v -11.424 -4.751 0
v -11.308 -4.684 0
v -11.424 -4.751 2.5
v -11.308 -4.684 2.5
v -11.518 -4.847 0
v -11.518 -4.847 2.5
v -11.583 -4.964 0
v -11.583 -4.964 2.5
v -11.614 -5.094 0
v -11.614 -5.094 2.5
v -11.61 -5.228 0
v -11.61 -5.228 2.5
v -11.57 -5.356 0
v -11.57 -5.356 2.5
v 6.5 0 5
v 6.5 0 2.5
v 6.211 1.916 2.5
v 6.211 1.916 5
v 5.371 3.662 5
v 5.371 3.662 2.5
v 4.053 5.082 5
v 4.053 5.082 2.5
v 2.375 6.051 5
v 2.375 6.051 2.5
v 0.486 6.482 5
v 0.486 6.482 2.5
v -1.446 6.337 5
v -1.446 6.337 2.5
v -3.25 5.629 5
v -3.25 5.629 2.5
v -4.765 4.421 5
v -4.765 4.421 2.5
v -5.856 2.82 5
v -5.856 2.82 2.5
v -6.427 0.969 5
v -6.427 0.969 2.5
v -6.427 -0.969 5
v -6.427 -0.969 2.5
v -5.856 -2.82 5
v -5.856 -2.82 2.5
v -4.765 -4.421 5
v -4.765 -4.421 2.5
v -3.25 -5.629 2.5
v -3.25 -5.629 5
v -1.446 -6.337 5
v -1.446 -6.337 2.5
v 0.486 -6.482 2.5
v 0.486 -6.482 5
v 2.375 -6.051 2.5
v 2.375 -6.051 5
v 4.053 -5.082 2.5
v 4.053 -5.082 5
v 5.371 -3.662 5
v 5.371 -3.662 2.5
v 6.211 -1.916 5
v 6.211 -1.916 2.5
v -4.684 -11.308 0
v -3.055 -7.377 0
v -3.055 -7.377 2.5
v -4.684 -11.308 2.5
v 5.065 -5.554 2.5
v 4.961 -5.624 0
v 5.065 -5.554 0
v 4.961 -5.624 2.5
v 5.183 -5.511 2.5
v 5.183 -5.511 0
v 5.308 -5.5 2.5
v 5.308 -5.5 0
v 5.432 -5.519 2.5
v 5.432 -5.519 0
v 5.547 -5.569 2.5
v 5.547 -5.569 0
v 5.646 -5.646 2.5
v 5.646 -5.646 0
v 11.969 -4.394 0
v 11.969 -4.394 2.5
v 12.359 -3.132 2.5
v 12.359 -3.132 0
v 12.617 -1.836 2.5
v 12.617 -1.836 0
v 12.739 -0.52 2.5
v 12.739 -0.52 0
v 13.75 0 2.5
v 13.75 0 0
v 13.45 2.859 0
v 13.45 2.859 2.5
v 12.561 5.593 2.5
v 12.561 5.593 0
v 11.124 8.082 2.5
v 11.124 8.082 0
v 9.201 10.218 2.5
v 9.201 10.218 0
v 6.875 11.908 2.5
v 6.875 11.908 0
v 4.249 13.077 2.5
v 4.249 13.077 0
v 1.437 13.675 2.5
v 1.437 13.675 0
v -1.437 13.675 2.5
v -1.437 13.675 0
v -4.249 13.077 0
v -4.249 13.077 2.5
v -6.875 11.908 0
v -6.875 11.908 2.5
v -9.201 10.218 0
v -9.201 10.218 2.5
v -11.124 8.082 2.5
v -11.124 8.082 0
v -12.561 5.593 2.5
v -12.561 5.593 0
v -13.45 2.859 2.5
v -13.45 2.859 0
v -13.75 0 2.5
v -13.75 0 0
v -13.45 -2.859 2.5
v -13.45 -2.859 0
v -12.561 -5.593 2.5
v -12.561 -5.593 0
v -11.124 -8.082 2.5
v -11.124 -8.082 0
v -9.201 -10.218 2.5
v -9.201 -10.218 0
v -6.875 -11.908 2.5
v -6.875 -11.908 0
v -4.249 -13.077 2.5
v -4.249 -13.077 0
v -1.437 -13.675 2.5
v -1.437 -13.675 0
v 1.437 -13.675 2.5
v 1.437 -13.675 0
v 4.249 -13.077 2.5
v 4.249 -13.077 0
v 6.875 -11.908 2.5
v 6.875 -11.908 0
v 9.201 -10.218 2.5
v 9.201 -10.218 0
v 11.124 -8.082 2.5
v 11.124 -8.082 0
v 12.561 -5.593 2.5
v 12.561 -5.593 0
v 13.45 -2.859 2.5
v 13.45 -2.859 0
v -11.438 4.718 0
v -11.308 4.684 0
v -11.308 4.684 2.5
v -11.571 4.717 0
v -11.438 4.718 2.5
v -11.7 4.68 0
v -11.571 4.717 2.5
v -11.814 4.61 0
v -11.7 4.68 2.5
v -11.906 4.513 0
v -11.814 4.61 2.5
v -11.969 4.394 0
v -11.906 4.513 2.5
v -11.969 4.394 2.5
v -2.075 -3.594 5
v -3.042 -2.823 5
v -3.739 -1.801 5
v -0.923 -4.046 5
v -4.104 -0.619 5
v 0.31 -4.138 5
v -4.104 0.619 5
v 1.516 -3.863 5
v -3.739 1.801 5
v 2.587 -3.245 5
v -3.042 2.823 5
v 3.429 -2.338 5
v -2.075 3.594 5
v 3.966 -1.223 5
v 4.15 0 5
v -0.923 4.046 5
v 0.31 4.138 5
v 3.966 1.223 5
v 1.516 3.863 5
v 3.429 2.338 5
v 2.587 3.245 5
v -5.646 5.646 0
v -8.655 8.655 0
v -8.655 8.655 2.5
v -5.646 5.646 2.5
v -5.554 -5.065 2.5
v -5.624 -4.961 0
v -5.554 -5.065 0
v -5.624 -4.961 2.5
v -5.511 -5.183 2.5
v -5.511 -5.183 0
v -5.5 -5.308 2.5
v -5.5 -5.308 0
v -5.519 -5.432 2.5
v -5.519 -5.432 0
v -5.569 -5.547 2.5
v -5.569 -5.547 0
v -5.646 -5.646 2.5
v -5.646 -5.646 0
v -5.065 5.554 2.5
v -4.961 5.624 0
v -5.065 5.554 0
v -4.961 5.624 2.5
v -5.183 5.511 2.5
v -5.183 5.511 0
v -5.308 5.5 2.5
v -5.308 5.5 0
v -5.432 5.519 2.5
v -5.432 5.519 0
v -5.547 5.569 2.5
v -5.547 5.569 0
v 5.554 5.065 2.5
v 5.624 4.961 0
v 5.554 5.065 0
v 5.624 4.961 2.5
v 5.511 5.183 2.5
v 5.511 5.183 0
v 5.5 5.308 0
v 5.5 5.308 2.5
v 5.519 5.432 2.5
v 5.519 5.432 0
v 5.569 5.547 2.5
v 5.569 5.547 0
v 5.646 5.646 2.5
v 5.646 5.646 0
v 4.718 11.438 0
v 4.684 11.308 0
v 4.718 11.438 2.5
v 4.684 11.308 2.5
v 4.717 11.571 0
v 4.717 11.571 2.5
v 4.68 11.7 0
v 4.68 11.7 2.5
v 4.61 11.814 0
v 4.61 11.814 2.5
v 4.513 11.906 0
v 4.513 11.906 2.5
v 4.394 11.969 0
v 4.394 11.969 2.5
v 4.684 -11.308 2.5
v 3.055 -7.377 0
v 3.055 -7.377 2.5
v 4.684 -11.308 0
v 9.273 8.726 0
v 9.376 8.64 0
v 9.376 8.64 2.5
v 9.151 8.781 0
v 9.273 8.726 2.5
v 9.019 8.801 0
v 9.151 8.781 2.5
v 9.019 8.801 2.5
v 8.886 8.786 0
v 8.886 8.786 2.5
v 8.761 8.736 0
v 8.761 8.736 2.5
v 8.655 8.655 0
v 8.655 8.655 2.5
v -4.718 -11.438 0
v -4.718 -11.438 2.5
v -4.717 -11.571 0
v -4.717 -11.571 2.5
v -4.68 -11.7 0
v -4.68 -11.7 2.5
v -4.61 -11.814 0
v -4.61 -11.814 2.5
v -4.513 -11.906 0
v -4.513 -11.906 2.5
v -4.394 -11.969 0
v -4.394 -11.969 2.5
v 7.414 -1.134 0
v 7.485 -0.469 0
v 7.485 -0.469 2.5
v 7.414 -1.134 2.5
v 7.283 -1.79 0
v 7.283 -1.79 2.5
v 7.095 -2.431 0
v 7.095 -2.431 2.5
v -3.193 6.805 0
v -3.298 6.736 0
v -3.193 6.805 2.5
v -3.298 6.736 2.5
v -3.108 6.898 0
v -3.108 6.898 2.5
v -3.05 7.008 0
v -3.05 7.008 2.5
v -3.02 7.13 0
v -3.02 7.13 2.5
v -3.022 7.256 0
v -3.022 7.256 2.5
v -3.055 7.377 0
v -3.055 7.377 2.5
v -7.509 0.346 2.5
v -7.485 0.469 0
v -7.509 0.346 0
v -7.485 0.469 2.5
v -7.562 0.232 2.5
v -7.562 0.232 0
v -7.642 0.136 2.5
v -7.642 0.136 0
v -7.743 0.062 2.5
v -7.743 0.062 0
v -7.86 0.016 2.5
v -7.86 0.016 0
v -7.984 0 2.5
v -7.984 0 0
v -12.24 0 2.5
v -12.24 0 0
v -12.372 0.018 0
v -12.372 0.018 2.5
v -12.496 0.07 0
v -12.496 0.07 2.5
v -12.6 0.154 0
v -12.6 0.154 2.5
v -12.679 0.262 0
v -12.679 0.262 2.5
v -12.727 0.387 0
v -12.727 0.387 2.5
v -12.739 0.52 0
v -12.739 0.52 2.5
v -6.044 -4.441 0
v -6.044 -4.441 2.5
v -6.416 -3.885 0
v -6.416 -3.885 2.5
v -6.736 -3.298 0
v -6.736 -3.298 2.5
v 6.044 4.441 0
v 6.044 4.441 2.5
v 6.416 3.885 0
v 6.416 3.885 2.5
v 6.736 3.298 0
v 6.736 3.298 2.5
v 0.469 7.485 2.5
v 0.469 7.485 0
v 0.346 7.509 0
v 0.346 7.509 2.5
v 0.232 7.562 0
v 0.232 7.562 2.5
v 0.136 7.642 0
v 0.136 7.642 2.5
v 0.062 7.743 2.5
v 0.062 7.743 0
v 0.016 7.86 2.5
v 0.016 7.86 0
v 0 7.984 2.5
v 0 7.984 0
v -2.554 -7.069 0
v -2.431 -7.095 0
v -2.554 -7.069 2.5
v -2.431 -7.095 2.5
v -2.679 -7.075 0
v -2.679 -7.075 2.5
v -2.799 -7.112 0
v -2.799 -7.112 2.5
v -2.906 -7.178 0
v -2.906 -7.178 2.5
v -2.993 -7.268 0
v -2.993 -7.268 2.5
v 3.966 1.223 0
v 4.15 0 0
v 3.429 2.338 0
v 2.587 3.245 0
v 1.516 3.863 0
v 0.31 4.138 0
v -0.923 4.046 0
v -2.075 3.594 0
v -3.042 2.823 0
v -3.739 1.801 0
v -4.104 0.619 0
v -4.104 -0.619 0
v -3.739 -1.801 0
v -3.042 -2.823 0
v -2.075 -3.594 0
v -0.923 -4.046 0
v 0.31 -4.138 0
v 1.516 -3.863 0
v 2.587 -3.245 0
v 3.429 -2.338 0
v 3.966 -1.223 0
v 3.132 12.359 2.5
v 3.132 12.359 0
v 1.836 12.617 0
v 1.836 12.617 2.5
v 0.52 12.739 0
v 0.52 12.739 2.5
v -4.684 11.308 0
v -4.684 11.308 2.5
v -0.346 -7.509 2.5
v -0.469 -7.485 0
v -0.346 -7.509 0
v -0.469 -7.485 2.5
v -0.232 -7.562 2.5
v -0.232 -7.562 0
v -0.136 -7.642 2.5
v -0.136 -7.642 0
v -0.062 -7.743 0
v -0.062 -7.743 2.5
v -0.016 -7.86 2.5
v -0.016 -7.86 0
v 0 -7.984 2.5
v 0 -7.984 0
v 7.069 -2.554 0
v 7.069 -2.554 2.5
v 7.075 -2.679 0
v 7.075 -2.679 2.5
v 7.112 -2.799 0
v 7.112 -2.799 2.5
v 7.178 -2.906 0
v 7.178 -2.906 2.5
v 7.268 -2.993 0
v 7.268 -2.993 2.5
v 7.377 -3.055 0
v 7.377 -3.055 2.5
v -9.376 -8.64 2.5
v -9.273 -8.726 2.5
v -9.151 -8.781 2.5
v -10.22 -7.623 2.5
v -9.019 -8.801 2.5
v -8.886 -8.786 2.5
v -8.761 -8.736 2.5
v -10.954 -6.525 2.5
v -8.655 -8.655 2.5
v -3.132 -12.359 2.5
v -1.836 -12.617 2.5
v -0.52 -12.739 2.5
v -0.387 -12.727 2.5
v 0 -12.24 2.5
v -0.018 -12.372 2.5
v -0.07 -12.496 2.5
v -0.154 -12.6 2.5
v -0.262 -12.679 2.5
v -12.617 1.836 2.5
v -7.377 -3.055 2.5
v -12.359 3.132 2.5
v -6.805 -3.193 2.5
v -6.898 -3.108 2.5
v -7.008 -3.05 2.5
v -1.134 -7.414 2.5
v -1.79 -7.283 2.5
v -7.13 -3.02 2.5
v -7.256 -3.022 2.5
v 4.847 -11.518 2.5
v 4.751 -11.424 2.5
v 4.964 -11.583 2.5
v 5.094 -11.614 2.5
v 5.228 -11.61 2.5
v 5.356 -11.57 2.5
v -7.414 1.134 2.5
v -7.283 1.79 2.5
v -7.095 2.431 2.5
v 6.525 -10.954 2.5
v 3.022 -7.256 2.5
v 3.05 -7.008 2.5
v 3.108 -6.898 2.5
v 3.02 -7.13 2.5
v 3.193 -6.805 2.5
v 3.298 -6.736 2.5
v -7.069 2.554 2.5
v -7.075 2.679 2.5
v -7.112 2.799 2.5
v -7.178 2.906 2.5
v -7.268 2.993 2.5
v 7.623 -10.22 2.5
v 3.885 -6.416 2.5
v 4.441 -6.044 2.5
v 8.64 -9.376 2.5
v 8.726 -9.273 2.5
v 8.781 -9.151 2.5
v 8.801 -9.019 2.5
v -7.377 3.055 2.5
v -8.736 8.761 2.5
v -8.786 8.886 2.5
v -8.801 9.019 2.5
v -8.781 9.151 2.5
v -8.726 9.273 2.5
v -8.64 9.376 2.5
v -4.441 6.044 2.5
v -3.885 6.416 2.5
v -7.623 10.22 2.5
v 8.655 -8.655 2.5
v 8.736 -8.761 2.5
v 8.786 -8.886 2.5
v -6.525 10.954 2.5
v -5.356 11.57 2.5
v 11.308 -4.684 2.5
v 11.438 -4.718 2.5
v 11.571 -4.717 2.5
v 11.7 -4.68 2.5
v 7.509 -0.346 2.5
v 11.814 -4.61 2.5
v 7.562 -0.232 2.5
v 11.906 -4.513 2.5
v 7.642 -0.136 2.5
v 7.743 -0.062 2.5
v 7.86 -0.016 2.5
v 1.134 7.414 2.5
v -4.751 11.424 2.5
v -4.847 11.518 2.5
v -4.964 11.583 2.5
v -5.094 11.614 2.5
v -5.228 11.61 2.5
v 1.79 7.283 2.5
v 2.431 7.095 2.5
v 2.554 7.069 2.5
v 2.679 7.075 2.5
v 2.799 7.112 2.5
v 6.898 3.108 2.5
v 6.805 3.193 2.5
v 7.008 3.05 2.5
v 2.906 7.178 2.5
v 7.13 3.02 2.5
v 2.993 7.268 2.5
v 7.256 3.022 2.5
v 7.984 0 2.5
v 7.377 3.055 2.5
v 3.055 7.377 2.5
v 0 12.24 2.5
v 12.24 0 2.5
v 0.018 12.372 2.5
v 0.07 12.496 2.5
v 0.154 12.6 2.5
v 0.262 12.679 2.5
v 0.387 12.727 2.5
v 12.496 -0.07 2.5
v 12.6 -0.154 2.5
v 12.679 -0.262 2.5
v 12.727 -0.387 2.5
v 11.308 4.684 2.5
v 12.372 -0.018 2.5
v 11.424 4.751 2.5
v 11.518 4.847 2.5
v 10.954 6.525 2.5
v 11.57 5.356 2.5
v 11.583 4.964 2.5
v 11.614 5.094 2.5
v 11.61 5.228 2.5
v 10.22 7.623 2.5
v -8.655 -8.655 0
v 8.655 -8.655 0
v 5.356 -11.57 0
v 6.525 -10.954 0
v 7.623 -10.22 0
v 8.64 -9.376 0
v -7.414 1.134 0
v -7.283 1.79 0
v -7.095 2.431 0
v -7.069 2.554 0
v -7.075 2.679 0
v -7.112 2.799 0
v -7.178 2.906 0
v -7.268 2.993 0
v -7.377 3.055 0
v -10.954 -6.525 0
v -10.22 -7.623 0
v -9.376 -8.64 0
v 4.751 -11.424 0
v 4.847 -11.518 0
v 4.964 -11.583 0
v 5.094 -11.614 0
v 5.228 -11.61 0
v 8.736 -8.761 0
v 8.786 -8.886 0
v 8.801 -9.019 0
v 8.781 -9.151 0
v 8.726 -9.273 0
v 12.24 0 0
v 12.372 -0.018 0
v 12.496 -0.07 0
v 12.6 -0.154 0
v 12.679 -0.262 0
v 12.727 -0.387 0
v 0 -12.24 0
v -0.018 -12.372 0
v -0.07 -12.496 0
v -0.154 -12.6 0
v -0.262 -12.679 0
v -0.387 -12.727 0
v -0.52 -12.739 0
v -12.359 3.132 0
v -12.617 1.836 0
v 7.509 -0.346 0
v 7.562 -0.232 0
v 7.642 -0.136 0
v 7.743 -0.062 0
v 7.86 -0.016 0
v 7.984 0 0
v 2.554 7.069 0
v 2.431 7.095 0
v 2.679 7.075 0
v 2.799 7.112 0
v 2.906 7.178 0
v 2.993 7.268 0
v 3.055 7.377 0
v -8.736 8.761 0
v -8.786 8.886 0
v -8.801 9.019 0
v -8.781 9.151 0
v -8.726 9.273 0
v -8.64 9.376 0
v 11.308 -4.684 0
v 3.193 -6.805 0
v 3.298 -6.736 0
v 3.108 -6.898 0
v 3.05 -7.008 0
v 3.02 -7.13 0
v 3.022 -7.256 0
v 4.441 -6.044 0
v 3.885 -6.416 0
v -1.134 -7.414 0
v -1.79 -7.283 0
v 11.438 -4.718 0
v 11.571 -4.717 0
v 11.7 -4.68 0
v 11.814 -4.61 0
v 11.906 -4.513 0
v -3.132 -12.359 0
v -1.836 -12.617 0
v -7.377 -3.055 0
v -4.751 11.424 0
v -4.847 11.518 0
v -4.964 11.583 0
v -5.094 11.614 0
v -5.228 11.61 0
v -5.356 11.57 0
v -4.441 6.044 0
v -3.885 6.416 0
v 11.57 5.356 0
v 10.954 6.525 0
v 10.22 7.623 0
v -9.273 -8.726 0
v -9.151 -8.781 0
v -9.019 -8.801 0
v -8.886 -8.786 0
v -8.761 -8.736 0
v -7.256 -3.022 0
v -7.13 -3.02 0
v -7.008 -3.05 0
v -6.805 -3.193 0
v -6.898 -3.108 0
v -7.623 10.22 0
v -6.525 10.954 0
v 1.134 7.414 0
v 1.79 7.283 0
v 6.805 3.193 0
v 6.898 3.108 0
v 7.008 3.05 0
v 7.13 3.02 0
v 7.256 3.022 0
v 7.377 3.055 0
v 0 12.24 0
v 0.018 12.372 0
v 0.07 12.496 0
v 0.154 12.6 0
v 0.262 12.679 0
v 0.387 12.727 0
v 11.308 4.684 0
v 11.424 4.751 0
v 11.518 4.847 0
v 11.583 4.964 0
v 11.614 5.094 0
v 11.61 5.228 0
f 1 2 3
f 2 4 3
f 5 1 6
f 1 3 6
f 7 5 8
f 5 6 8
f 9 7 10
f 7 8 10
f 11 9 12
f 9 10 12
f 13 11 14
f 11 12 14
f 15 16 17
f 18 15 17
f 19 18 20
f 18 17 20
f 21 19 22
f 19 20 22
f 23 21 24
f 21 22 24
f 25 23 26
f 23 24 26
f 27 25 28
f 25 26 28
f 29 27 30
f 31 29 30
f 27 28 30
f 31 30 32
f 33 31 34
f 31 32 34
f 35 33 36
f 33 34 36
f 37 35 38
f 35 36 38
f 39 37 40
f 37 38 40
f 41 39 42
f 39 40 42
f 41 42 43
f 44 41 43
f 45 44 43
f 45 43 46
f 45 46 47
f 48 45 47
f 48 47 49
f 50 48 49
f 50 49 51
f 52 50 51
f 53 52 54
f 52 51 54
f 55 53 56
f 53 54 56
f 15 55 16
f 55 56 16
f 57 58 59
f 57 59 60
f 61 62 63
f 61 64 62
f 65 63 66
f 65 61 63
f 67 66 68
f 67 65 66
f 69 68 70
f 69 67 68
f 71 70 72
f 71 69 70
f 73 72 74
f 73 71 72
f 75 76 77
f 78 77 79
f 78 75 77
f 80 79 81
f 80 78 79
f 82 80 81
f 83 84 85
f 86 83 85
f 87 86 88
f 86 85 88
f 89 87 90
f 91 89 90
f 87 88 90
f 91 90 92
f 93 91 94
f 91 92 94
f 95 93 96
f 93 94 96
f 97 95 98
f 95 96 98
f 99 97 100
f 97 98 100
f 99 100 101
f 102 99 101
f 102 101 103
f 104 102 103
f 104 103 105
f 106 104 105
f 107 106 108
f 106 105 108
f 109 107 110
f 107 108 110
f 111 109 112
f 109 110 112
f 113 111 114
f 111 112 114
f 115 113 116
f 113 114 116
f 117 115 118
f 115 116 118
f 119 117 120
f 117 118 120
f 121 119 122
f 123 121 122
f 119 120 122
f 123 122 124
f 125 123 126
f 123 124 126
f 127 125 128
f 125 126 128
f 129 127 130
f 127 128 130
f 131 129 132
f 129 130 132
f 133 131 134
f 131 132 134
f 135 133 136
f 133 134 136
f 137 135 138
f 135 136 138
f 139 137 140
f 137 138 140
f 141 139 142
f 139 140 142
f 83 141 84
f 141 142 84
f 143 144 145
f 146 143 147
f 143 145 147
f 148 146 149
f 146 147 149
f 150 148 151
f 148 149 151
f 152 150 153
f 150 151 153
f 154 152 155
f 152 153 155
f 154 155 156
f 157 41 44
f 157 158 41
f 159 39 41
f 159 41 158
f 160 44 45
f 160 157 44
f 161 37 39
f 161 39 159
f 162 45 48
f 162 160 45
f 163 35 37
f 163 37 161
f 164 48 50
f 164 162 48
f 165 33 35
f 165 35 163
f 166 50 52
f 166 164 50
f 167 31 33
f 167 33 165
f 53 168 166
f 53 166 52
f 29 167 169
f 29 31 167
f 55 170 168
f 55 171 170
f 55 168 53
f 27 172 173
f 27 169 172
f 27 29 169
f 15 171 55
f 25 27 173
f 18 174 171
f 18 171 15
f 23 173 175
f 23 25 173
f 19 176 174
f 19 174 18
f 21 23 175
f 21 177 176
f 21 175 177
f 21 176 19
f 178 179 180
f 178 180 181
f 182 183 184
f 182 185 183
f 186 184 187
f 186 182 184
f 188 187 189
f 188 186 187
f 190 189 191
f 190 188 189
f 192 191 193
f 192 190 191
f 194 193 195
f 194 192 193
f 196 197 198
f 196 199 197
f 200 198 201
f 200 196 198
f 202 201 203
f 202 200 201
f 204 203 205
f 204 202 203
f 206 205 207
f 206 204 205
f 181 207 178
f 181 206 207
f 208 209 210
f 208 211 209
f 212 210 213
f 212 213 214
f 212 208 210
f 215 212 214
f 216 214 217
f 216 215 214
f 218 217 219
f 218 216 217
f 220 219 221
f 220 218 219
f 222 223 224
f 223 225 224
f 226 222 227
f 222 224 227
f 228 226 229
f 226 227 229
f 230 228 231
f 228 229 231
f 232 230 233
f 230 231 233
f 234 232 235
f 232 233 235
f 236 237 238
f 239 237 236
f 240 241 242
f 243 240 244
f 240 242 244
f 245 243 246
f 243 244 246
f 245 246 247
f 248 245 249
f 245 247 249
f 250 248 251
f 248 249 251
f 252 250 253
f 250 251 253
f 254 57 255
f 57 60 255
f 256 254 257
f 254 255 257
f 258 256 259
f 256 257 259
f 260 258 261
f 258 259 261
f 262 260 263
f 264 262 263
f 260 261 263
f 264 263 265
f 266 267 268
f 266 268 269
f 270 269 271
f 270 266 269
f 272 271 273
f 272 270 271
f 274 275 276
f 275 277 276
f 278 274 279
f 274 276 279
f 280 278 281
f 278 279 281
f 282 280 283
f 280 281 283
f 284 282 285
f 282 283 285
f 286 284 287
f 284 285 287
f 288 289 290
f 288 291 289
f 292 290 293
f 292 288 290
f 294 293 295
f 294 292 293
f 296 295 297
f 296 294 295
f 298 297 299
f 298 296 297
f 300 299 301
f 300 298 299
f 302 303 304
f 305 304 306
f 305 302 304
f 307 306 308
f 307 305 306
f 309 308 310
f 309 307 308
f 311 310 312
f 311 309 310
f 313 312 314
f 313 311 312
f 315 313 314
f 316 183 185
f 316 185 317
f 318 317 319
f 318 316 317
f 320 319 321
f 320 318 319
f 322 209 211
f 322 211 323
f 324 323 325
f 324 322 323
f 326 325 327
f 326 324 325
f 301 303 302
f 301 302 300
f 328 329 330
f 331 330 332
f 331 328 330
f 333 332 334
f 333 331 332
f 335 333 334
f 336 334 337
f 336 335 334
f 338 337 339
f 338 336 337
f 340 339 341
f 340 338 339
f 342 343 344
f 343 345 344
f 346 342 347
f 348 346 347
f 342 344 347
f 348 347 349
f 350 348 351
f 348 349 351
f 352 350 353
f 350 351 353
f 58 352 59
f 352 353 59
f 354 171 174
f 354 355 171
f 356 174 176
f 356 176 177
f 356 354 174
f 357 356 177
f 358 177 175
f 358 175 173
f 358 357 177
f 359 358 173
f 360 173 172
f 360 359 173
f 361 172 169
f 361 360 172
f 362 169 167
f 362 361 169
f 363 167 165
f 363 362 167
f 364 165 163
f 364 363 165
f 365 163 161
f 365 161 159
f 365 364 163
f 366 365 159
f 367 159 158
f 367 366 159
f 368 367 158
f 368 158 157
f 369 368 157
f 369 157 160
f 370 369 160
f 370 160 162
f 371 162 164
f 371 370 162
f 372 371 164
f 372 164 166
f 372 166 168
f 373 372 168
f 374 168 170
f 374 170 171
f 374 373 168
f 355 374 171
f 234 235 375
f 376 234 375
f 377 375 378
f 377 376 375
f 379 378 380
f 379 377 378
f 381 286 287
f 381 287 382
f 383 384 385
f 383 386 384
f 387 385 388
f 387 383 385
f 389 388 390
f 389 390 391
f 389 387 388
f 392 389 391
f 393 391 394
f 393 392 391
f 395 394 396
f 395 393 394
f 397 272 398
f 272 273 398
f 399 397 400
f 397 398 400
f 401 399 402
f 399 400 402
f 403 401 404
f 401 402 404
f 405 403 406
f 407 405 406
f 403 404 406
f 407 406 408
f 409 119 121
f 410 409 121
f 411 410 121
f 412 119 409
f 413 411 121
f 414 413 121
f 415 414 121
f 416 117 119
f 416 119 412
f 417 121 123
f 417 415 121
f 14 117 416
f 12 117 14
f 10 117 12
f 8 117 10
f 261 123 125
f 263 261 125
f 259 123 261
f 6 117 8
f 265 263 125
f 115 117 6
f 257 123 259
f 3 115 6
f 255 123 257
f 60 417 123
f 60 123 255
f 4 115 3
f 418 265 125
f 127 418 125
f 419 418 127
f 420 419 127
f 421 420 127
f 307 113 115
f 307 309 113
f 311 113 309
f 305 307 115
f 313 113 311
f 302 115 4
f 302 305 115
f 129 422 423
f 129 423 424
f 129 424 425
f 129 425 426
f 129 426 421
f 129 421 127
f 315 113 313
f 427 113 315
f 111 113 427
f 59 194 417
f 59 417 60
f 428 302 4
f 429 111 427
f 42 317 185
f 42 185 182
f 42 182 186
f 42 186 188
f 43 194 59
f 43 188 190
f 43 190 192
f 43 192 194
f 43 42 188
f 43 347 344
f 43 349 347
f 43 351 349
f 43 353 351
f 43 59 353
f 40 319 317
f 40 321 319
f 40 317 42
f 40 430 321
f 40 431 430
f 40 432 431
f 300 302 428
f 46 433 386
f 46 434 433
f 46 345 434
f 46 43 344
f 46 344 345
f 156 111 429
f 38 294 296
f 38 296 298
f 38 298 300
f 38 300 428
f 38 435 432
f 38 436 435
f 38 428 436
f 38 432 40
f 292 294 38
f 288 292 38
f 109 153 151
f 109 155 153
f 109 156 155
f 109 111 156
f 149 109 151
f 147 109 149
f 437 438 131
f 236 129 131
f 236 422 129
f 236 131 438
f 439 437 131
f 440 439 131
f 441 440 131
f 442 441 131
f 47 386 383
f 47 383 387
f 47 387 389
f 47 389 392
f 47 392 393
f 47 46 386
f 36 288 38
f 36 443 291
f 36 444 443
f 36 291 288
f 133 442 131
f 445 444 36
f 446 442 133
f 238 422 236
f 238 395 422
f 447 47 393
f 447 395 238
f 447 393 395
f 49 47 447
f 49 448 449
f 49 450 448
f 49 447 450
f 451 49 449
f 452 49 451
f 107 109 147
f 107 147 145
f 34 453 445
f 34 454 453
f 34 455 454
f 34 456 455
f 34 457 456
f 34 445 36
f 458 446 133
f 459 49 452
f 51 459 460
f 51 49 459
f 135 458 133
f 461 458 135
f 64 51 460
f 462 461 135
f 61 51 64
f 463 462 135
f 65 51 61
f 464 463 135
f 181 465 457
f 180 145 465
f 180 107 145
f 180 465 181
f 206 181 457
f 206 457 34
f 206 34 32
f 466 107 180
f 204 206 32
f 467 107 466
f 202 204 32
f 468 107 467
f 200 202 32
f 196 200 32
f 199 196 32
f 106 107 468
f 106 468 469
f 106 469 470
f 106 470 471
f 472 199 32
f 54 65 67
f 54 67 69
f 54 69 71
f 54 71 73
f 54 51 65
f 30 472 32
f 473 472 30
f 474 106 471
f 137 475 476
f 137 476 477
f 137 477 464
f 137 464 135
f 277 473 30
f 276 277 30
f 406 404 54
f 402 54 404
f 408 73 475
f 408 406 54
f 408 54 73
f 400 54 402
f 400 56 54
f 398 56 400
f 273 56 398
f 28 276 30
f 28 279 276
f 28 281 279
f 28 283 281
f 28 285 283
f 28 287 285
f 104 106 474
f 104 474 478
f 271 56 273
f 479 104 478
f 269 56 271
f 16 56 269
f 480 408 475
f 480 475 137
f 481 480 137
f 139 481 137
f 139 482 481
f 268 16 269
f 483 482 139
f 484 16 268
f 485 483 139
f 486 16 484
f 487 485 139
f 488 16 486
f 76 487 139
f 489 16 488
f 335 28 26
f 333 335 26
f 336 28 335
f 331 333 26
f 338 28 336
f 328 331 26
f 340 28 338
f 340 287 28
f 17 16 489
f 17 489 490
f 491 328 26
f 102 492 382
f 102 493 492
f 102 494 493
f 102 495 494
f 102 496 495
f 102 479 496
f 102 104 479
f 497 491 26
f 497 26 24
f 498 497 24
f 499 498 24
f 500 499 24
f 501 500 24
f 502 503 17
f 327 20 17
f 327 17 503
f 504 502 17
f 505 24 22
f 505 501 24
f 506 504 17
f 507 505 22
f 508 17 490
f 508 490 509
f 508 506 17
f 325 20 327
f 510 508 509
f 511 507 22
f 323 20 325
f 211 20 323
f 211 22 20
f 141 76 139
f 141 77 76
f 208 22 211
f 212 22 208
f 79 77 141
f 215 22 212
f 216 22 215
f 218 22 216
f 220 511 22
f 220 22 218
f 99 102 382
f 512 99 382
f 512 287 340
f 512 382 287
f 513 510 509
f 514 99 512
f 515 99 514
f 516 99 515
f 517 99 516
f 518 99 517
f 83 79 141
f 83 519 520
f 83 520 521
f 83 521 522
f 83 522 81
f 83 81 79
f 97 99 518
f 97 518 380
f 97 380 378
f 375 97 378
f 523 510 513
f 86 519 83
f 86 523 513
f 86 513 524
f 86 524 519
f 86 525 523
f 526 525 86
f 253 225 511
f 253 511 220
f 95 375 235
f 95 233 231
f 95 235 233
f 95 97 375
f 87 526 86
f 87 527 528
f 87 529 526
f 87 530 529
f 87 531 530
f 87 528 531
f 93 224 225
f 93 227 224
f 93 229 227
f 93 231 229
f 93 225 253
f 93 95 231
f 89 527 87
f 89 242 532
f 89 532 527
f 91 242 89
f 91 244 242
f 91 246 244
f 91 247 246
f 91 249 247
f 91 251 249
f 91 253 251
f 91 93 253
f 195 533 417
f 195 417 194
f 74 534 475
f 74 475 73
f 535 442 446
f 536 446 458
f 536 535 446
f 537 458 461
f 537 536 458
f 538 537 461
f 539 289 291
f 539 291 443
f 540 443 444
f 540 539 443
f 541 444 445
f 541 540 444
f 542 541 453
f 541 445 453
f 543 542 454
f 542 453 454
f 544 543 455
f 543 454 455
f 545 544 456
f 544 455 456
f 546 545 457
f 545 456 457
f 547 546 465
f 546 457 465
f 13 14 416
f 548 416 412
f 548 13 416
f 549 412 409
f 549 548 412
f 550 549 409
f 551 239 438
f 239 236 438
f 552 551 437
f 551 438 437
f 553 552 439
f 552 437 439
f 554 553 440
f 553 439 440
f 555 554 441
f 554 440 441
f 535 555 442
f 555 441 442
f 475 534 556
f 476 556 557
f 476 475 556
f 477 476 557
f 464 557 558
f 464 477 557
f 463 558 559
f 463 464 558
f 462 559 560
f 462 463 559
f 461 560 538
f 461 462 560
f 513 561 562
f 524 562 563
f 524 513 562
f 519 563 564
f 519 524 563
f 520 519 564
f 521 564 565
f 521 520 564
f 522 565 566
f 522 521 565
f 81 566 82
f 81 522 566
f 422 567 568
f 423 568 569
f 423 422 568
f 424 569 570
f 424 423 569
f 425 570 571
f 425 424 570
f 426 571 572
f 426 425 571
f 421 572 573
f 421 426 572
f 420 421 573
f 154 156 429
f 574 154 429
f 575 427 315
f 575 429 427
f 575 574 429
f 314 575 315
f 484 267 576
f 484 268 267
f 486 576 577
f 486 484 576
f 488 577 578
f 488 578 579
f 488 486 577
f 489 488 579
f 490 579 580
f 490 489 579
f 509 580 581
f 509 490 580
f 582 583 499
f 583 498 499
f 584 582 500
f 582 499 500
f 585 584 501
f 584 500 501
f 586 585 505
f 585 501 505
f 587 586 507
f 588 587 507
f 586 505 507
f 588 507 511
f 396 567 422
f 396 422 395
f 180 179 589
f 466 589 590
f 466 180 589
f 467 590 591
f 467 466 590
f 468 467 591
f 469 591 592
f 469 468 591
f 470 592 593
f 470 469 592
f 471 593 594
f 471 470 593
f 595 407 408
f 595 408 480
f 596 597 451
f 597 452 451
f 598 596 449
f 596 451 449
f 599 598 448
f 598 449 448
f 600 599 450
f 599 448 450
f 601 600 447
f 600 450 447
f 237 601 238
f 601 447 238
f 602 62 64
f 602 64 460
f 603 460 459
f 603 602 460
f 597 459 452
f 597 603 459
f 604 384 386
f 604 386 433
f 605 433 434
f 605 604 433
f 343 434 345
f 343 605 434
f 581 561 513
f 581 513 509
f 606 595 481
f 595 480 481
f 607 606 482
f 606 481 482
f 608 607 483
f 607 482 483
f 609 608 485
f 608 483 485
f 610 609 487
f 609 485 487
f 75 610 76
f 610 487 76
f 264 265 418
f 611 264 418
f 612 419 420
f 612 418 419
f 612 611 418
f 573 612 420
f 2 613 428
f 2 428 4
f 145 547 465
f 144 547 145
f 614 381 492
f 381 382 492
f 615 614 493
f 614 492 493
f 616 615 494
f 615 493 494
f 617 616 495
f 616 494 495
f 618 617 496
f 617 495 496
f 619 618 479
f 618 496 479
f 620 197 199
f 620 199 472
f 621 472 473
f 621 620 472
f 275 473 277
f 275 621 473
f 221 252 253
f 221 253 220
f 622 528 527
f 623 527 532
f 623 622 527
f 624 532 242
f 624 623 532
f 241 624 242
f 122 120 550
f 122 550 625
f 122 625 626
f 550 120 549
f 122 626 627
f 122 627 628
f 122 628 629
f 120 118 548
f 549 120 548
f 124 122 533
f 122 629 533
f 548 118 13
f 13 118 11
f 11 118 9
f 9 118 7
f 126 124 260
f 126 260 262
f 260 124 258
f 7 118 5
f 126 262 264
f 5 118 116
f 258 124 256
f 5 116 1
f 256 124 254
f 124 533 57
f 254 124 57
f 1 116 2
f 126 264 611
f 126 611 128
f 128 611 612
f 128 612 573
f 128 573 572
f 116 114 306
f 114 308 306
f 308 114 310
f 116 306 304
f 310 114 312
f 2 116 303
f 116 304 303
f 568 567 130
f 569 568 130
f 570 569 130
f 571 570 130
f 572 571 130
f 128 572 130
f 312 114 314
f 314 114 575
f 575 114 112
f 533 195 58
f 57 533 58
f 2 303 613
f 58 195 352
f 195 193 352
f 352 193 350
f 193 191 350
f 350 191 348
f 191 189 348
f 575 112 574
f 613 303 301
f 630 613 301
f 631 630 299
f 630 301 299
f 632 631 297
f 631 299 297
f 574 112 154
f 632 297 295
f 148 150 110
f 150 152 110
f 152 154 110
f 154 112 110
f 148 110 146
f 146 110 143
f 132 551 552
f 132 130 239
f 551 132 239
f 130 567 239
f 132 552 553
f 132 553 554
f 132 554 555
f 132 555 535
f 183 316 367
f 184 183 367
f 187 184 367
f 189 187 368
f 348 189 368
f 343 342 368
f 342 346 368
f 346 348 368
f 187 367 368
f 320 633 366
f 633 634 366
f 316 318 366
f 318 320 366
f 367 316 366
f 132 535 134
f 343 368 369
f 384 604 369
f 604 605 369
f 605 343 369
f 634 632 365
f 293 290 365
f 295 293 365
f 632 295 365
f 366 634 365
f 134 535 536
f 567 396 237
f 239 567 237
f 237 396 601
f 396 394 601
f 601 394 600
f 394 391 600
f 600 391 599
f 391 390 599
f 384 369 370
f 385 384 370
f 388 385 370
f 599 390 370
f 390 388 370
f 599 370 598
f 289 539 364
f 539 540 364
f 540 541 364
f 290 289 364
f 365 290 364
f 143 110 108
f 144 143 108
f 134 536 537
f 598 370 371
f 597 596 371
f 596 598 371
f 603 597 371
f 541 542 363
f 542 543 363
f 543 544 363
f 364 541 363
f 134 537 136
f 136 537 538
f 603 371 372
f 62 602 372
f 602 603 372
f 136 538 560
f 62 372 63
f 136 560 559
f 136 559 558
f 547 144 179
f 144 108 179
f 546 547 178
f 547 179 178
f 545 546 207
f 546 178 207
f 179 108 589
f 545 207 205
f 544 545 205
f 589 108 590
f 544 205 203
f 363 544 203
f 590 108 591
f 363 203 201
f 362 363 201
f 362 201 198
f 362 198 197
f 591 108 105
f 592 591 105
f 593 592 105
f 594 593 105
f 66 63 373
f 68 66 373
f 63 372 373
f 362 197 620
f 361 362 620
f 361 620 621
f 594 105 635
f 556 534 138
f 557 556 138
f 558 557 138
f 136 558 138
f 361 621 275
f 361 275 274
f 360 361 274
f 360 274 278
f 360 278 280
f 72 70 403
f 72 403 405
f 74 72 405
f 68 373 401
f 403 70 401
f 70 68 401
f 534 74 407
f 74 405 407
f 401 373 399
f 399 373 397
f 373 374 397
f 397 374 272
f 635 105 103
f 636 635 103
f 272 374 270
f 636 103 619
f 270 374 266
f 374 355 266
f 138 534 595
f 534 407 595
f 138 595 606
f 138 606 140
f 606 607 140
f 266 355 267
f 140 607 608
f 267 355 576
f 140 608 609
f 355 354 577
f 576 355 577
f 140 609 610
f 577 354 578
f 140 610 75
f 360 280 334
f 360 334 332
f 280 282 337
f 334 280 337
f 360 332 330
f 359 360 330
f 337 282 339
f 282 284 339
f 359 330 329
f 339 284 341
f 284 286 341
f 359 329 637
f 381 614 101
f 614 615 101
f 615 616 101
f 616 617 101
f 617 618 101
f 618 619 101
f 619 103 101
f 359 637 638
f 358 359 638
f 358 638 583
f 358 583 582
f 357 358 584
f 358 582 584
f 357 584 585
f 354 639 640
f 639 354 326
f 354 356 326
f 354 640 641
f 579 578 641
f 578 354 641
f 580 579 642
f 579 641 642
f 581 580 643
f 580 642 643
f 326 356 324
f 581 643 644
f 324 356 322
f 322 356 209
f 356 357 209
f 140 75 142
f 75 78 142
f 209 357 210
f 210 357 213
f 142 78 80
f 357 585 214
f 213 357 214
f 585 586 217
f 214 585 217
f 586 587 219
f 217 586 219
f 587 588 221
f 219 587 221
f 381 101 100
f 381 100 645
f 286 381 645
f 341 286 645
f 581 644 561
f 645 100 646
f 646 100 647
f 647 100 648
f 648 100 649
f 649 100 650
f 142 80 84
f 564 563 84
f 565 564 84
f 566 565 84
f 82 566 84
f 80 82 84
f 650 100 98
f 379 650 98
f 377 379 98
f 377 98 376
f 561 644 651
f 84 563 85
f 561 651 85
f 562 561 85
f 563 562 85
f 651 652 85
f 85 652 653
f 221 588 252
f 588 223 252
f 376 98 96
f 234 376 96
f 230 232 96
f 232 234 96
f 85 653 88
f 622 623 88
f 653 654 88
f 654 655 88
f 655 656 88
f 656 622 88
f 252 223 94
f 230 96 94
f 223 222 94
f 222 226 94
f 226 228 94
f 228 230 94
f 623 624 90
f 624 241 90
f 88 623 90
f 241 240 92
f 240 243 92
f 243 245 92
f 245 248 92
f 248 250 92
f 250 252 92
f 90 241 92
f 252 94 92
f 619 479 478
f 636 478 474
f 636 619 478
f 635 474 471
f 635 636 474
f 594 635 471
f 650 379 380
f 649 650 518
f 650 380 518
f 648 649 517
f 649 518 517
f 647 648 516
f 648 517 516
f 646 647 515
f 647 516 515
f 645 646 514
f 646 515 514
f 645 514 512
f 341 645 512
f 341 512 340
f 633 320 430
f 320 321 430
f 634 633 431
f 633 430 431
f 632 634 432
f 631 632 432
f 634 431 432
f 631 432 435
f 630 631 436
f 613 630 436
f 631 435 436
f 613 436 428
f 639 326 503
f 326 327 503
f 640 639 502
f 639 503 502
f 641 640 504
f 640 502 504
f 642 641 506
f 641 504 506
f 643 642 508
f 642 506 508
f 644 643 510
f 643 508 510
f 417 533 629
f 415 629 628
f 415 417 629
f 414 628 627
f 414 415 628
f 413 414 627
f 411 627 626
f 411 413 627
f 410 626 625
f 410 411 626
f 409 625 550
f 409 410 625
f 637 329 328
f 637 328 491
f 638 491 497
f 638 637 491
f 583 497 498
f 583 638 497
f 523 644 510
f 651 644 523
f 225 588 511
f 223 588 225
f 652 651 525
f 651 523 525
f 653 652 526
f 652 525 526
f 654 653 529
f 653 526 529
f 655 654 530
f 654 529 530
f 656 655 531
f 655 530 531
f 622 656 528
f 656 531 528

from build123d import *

# Parameters (mm, degrees)
SKETCH1_R                = 13.75
SKETCH1_R_2              = 4.15
BOSS_EXTRUDE1_DEPTH      = 2.5
SKETCH2_R                = 6.5
SKETCH2_R_2              = 4.15
BOSS_EXTRUDE2_DEPTH      = 2.5
CUT_EXTRUDE1_DEPTH       = 21.077973005
FILLET1_R                = 0.5
CIRPATTERN1_COUNT        = 8
FILLET1_OF_CIRPATTERN1_R = 0.5


with BuildPart() as part:
    # Sketch1 → Boss-Extrude1 (new body)
    with BuildSketch(Plane.XY):
        Circle(SKETCH1_R)
        Circle(SKETCH1_R_2, mode=Mode.SUBTRACT)
    extrude(amount=BOSS_EXTRUDE1_DEPTH)

    # Sketch2 → Boss-Extrude2 (add)
    with BuildSketch(Plane.XY.offset(2.5)):
        Circle(SKETCH2_R)
        Circle(SKETCH2_R_2, mode=Mode.SUBTRACT)
    extrude(amount=BOSS_EXTRUDE2_DEPTH)

    # Sketch5 → Cut-Extrude1 (cut, through all)
    with BuildSketch(Plane.XY):
        with BuildLine():
            Line((0, 12.75), (0, 7.5))
            ThreePointArc((0, 7.5), (1.463177415, 7.355889603), (2.870125743, 6.929096494))
            Line((2.870125743, 6.929096494), (4.879213763, 11.77946404))
            ThreePointArc((4.879213763, 11.77946404), (2.487401606, 12.505012325), (0, 12.75))
        make_face()
    cut_extrude1 = extrude(amount=CUT_EXTRUDE1_DEPTH, mode=Mode.SUBTRACT)

    # Fillet1
    fillet1_edges = [part.edges().sort_by_distance(p)[0] for p in [
        (0, 7.5, 1.25),
        (2.870125743, 6.929096494, 1.25),
        (4.879213763, 11.77946404, 1.25),
        (0, 12.75, 1.25),
    ]]
    fillet(fillet1_edges, radius=FILLET1_R)

    # CirPattern1: Cut-Extrude1 ×8 about axis
    cirpattern1_axis = Axis((0, 0, 0), (0, 0, 1))
    for i in range(1, CIRPATTERN1_COUNT):
        add(cut_extrude1.rotate(cirpattern1_axis, i * 360 / CIRPATTERN1_COUNT), mode=Mode.SUBTRACT)

    # Fillet1 of CirPattern1
    fillet1_of_cirpattern1_edges = [part.edges().sort_by_distance(p)[0] for p in [
        (-5.303300859, 5.303300859, 1.25),
        (-2.870125743, 6.929096494, 1.25),
        (-4.879213763, 11.77946404, 1.25),
        (-9.01561146, 9.01561146, 1.25),
        (-7.5, 0, 1.25),
        (-6.929096494, 2.870125743, 1.25),
        (-11.77946404, 4.879213763, 1.25),
        (-12.75, 0, 1.25),
        (-5.303300859, -5.303300859, 1.25),
        (-6.929096494, -2.870125743, 1.25),
        (-11.77946404, -4.879213763, 1.25),
        (-9.01561146, -9.01561146, 1.25),
        (0, -7.5, 1.25),
        (-2.870125743, -6.929096494, 1.25),
        (-4.879213763, -11.77946404, 1.25),
        (0, -12.75, 1.25),
        (5.303300859, -5.303300859, 1.25),
        (2.870125743, -6.929096494, 1.25),
        (4.879213763, -11.77946404, 1.25),
        (9.01561146, -9.01561146, 1.25),
        (7.5, 0, 1.25),
        (6.929096494, -2.870125743, 1.25),
        (11.77946404, -4.879213763, 1.25),
        (12.75, 0, 1.25),
        (5.303300859, 5.303300859, 1.25),
        (6.929096494, 2.870125743, 1.25),
        (11.77946404, 4.879213763, 1.25),
        (9.01561146, 9.01561146, 1.25),
    ]]
    fillet(fillet1_of_cirpattern1_edges, radius=FILLET1_OF_CIRPATTERN1_R)


solid = part.part
